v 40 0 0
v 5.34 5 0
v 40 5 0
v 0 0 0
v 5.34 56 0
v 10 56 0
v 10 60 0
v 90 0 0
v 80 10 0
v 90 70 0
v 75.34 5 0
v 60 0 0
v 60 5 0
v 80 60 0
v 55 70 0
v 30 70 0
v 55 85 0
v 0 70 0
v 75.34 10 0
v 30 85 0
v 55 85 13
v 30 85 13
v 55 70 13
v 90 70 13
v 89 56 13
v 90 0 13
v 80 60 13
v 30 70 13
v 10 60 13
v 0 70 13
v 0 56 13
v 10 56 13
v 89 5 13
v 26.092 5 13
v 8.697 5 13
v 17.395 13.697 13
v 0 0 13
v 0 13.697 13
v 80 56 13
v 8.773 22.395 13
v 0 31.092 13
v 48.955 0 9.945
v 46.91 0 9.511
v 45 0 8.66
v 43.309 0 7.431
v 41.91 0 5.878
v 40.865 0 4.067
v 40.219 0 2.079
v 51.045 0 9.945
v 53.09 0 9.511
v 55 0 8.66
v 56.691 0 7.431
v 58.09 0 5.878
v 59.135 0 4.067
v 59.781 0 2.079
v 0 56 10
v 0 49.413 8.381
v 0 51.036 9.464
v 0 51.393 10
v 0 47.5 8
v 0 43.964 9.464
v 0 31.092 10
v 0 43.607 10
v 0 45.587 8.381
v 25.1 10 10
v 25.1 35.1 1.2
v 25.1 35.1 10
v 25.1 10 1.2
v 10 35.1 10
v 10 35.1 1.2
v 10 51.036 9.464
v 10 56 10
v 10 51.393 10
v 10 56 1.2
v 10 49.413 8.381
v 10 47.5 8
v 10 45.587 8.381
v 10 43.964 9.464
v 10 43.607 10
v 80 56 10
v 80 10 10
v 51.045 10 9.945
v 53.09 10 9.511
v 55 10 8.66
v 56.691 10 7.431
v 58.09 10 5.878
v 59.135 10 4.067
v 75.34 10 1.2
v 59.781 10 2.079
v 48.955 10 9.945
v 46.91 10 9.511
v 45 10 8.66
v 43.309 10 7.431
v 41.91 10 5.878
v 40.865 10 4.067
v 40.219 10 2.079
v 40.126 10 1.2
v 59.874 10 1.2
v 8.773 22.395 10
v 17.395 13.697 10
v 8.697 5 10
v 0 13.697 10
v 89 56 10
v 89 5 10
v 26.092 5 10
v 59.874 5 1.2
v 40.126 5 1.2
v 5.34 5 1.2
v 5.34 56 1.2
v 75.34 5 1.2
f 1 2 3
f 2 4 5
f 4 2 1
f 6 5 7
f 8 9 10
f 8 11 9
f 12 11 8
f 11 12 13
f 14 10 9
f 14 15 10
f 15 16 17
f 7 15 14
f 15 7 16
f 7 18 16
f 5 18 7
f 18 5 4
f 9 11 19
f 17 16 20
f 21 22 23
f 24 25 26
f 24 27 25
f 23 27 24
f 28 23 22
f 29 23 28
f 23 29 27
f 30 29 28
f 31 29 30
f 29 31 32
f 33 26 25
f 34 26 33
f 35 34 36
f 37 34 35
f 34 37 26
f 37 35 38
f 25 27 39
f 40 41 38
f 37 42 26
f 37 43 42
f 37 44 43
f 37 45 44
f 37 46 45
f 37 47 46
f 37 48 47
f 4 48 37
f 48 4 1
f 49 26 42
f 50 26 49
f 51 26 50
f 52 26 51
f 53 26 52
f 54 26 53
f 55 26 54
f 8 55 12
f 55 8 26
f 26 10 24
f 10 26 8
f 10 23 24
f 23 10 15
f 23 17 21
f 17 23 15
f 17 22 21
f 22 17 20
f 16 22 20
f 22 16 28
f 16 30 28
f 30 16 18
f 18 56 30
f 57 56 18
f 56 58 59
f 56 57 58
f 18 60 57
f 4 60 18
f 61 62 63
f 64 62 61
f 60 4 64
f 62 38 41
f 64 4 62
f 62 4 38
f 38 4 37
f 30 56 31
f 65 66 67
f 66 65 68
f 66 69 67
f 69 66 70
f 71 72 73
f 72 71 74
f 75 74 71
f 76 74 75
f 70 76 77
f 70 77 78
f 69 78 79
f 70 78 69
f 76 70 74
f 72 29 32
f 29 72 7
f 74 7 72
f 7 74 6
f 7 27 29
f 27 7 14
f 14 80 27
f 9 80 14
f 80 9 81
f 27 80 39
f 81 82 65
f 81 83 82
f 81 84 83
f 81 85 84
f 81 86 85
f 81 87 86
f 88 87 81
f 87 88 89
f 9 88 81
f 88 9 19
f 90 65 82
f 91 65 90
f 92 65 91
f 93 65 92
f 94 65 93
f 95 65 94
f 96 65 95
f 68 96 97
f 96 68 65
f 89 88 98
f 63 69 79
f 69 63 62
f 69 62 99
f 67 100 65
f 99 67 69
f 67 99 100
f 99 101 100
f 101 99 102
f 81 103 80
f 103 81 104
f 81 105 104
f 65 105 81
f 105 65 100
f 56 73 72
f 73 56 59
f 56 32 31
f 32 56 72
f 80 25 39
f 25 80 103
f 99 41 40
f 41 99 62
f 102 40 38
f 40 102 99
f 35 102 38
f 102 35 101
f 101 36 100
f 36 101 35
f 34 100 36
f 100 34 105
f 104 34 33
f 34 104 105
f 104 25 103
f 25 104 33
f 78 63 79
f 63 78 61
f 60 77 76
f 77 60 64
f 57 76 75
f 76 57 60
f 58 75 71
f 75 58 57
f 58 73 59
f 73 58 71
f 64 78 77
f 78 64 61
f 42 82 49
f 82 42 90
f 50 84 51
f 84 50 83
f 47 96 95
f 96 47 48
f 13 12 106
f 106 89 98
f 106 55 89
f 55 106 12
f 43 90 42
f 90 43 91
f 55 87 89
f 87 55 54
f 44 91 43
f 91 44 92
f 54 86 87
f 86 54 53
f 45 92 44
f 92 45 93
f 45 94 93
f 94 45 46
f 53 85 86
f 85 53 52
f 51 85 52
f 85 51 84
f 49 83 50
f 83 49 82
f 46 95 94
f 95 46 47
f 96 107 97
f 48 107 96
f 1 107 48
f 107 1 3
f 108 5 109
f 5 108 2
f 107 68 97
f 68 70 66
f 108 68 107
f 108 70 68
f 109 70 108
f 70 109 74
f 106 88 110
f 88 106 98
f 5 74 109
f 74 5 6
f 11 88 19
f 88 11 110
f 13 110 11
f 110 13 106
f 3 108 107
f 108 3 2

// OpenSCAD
base_width = 90;
base_height = 70;
base_depth = 13;
base_wall_thickness = 10;

pcb_depth = 1.2;
pcb_height = 51;
pcb_length = 70;
pcb_length_offset = 5.34;

usb_module_support_length = 25.1;
card_height_position = 5;
card_depth = 3; 
card_finger_grabber_radius = 5;
cable_port_radius = 10;

plunger_offset = 30;
plunger_height = 15;
plunger_length = 25;


module pcb() {
    linear_extrude(height = pcb_depth) {
        square([pcb_length, pcb_height]);
    }
}

module frame() {
    union() {
        square([usb_module_support_length,usb_module_support_length+base_wall_thickness]);
        difference() {
            square([base_width,base_height]);  
            translate([base_wall_thickness,base_wall_thickness,0])
                square([base_width-base_wall_thickness*2, base_height - base_wall_thickness*2]);
        };            
    }
}

module case() {
    difference() {
        linear_extrude(height = base_depth) {
            union() {
               frame();
               translate([plunger_offset, base_height, 0])
                square([plunger_length, plunger_height]);
            }
        }
                
        translate([0, card_height_position, base_depth - card_depth])
            linear_extrude(height = card_depth)
                import (file = "pcb_boarder.dxf");
        
        translate([0, 47.5, base_depth])
            rotate([0,90,0])
                cylinder(base_wall_thickness, card_finger_grabber_radius, card_finger_grabber_radius);
        
        translate([50,0,0])
            rotate([-90,0,0])
                cylinder(base_wall_thickness, cable_port_radius, cable_port_radius);
        
        translate([pcb_length_offset, card_height_position, 0])
            pcb();
    }
}

case ();
